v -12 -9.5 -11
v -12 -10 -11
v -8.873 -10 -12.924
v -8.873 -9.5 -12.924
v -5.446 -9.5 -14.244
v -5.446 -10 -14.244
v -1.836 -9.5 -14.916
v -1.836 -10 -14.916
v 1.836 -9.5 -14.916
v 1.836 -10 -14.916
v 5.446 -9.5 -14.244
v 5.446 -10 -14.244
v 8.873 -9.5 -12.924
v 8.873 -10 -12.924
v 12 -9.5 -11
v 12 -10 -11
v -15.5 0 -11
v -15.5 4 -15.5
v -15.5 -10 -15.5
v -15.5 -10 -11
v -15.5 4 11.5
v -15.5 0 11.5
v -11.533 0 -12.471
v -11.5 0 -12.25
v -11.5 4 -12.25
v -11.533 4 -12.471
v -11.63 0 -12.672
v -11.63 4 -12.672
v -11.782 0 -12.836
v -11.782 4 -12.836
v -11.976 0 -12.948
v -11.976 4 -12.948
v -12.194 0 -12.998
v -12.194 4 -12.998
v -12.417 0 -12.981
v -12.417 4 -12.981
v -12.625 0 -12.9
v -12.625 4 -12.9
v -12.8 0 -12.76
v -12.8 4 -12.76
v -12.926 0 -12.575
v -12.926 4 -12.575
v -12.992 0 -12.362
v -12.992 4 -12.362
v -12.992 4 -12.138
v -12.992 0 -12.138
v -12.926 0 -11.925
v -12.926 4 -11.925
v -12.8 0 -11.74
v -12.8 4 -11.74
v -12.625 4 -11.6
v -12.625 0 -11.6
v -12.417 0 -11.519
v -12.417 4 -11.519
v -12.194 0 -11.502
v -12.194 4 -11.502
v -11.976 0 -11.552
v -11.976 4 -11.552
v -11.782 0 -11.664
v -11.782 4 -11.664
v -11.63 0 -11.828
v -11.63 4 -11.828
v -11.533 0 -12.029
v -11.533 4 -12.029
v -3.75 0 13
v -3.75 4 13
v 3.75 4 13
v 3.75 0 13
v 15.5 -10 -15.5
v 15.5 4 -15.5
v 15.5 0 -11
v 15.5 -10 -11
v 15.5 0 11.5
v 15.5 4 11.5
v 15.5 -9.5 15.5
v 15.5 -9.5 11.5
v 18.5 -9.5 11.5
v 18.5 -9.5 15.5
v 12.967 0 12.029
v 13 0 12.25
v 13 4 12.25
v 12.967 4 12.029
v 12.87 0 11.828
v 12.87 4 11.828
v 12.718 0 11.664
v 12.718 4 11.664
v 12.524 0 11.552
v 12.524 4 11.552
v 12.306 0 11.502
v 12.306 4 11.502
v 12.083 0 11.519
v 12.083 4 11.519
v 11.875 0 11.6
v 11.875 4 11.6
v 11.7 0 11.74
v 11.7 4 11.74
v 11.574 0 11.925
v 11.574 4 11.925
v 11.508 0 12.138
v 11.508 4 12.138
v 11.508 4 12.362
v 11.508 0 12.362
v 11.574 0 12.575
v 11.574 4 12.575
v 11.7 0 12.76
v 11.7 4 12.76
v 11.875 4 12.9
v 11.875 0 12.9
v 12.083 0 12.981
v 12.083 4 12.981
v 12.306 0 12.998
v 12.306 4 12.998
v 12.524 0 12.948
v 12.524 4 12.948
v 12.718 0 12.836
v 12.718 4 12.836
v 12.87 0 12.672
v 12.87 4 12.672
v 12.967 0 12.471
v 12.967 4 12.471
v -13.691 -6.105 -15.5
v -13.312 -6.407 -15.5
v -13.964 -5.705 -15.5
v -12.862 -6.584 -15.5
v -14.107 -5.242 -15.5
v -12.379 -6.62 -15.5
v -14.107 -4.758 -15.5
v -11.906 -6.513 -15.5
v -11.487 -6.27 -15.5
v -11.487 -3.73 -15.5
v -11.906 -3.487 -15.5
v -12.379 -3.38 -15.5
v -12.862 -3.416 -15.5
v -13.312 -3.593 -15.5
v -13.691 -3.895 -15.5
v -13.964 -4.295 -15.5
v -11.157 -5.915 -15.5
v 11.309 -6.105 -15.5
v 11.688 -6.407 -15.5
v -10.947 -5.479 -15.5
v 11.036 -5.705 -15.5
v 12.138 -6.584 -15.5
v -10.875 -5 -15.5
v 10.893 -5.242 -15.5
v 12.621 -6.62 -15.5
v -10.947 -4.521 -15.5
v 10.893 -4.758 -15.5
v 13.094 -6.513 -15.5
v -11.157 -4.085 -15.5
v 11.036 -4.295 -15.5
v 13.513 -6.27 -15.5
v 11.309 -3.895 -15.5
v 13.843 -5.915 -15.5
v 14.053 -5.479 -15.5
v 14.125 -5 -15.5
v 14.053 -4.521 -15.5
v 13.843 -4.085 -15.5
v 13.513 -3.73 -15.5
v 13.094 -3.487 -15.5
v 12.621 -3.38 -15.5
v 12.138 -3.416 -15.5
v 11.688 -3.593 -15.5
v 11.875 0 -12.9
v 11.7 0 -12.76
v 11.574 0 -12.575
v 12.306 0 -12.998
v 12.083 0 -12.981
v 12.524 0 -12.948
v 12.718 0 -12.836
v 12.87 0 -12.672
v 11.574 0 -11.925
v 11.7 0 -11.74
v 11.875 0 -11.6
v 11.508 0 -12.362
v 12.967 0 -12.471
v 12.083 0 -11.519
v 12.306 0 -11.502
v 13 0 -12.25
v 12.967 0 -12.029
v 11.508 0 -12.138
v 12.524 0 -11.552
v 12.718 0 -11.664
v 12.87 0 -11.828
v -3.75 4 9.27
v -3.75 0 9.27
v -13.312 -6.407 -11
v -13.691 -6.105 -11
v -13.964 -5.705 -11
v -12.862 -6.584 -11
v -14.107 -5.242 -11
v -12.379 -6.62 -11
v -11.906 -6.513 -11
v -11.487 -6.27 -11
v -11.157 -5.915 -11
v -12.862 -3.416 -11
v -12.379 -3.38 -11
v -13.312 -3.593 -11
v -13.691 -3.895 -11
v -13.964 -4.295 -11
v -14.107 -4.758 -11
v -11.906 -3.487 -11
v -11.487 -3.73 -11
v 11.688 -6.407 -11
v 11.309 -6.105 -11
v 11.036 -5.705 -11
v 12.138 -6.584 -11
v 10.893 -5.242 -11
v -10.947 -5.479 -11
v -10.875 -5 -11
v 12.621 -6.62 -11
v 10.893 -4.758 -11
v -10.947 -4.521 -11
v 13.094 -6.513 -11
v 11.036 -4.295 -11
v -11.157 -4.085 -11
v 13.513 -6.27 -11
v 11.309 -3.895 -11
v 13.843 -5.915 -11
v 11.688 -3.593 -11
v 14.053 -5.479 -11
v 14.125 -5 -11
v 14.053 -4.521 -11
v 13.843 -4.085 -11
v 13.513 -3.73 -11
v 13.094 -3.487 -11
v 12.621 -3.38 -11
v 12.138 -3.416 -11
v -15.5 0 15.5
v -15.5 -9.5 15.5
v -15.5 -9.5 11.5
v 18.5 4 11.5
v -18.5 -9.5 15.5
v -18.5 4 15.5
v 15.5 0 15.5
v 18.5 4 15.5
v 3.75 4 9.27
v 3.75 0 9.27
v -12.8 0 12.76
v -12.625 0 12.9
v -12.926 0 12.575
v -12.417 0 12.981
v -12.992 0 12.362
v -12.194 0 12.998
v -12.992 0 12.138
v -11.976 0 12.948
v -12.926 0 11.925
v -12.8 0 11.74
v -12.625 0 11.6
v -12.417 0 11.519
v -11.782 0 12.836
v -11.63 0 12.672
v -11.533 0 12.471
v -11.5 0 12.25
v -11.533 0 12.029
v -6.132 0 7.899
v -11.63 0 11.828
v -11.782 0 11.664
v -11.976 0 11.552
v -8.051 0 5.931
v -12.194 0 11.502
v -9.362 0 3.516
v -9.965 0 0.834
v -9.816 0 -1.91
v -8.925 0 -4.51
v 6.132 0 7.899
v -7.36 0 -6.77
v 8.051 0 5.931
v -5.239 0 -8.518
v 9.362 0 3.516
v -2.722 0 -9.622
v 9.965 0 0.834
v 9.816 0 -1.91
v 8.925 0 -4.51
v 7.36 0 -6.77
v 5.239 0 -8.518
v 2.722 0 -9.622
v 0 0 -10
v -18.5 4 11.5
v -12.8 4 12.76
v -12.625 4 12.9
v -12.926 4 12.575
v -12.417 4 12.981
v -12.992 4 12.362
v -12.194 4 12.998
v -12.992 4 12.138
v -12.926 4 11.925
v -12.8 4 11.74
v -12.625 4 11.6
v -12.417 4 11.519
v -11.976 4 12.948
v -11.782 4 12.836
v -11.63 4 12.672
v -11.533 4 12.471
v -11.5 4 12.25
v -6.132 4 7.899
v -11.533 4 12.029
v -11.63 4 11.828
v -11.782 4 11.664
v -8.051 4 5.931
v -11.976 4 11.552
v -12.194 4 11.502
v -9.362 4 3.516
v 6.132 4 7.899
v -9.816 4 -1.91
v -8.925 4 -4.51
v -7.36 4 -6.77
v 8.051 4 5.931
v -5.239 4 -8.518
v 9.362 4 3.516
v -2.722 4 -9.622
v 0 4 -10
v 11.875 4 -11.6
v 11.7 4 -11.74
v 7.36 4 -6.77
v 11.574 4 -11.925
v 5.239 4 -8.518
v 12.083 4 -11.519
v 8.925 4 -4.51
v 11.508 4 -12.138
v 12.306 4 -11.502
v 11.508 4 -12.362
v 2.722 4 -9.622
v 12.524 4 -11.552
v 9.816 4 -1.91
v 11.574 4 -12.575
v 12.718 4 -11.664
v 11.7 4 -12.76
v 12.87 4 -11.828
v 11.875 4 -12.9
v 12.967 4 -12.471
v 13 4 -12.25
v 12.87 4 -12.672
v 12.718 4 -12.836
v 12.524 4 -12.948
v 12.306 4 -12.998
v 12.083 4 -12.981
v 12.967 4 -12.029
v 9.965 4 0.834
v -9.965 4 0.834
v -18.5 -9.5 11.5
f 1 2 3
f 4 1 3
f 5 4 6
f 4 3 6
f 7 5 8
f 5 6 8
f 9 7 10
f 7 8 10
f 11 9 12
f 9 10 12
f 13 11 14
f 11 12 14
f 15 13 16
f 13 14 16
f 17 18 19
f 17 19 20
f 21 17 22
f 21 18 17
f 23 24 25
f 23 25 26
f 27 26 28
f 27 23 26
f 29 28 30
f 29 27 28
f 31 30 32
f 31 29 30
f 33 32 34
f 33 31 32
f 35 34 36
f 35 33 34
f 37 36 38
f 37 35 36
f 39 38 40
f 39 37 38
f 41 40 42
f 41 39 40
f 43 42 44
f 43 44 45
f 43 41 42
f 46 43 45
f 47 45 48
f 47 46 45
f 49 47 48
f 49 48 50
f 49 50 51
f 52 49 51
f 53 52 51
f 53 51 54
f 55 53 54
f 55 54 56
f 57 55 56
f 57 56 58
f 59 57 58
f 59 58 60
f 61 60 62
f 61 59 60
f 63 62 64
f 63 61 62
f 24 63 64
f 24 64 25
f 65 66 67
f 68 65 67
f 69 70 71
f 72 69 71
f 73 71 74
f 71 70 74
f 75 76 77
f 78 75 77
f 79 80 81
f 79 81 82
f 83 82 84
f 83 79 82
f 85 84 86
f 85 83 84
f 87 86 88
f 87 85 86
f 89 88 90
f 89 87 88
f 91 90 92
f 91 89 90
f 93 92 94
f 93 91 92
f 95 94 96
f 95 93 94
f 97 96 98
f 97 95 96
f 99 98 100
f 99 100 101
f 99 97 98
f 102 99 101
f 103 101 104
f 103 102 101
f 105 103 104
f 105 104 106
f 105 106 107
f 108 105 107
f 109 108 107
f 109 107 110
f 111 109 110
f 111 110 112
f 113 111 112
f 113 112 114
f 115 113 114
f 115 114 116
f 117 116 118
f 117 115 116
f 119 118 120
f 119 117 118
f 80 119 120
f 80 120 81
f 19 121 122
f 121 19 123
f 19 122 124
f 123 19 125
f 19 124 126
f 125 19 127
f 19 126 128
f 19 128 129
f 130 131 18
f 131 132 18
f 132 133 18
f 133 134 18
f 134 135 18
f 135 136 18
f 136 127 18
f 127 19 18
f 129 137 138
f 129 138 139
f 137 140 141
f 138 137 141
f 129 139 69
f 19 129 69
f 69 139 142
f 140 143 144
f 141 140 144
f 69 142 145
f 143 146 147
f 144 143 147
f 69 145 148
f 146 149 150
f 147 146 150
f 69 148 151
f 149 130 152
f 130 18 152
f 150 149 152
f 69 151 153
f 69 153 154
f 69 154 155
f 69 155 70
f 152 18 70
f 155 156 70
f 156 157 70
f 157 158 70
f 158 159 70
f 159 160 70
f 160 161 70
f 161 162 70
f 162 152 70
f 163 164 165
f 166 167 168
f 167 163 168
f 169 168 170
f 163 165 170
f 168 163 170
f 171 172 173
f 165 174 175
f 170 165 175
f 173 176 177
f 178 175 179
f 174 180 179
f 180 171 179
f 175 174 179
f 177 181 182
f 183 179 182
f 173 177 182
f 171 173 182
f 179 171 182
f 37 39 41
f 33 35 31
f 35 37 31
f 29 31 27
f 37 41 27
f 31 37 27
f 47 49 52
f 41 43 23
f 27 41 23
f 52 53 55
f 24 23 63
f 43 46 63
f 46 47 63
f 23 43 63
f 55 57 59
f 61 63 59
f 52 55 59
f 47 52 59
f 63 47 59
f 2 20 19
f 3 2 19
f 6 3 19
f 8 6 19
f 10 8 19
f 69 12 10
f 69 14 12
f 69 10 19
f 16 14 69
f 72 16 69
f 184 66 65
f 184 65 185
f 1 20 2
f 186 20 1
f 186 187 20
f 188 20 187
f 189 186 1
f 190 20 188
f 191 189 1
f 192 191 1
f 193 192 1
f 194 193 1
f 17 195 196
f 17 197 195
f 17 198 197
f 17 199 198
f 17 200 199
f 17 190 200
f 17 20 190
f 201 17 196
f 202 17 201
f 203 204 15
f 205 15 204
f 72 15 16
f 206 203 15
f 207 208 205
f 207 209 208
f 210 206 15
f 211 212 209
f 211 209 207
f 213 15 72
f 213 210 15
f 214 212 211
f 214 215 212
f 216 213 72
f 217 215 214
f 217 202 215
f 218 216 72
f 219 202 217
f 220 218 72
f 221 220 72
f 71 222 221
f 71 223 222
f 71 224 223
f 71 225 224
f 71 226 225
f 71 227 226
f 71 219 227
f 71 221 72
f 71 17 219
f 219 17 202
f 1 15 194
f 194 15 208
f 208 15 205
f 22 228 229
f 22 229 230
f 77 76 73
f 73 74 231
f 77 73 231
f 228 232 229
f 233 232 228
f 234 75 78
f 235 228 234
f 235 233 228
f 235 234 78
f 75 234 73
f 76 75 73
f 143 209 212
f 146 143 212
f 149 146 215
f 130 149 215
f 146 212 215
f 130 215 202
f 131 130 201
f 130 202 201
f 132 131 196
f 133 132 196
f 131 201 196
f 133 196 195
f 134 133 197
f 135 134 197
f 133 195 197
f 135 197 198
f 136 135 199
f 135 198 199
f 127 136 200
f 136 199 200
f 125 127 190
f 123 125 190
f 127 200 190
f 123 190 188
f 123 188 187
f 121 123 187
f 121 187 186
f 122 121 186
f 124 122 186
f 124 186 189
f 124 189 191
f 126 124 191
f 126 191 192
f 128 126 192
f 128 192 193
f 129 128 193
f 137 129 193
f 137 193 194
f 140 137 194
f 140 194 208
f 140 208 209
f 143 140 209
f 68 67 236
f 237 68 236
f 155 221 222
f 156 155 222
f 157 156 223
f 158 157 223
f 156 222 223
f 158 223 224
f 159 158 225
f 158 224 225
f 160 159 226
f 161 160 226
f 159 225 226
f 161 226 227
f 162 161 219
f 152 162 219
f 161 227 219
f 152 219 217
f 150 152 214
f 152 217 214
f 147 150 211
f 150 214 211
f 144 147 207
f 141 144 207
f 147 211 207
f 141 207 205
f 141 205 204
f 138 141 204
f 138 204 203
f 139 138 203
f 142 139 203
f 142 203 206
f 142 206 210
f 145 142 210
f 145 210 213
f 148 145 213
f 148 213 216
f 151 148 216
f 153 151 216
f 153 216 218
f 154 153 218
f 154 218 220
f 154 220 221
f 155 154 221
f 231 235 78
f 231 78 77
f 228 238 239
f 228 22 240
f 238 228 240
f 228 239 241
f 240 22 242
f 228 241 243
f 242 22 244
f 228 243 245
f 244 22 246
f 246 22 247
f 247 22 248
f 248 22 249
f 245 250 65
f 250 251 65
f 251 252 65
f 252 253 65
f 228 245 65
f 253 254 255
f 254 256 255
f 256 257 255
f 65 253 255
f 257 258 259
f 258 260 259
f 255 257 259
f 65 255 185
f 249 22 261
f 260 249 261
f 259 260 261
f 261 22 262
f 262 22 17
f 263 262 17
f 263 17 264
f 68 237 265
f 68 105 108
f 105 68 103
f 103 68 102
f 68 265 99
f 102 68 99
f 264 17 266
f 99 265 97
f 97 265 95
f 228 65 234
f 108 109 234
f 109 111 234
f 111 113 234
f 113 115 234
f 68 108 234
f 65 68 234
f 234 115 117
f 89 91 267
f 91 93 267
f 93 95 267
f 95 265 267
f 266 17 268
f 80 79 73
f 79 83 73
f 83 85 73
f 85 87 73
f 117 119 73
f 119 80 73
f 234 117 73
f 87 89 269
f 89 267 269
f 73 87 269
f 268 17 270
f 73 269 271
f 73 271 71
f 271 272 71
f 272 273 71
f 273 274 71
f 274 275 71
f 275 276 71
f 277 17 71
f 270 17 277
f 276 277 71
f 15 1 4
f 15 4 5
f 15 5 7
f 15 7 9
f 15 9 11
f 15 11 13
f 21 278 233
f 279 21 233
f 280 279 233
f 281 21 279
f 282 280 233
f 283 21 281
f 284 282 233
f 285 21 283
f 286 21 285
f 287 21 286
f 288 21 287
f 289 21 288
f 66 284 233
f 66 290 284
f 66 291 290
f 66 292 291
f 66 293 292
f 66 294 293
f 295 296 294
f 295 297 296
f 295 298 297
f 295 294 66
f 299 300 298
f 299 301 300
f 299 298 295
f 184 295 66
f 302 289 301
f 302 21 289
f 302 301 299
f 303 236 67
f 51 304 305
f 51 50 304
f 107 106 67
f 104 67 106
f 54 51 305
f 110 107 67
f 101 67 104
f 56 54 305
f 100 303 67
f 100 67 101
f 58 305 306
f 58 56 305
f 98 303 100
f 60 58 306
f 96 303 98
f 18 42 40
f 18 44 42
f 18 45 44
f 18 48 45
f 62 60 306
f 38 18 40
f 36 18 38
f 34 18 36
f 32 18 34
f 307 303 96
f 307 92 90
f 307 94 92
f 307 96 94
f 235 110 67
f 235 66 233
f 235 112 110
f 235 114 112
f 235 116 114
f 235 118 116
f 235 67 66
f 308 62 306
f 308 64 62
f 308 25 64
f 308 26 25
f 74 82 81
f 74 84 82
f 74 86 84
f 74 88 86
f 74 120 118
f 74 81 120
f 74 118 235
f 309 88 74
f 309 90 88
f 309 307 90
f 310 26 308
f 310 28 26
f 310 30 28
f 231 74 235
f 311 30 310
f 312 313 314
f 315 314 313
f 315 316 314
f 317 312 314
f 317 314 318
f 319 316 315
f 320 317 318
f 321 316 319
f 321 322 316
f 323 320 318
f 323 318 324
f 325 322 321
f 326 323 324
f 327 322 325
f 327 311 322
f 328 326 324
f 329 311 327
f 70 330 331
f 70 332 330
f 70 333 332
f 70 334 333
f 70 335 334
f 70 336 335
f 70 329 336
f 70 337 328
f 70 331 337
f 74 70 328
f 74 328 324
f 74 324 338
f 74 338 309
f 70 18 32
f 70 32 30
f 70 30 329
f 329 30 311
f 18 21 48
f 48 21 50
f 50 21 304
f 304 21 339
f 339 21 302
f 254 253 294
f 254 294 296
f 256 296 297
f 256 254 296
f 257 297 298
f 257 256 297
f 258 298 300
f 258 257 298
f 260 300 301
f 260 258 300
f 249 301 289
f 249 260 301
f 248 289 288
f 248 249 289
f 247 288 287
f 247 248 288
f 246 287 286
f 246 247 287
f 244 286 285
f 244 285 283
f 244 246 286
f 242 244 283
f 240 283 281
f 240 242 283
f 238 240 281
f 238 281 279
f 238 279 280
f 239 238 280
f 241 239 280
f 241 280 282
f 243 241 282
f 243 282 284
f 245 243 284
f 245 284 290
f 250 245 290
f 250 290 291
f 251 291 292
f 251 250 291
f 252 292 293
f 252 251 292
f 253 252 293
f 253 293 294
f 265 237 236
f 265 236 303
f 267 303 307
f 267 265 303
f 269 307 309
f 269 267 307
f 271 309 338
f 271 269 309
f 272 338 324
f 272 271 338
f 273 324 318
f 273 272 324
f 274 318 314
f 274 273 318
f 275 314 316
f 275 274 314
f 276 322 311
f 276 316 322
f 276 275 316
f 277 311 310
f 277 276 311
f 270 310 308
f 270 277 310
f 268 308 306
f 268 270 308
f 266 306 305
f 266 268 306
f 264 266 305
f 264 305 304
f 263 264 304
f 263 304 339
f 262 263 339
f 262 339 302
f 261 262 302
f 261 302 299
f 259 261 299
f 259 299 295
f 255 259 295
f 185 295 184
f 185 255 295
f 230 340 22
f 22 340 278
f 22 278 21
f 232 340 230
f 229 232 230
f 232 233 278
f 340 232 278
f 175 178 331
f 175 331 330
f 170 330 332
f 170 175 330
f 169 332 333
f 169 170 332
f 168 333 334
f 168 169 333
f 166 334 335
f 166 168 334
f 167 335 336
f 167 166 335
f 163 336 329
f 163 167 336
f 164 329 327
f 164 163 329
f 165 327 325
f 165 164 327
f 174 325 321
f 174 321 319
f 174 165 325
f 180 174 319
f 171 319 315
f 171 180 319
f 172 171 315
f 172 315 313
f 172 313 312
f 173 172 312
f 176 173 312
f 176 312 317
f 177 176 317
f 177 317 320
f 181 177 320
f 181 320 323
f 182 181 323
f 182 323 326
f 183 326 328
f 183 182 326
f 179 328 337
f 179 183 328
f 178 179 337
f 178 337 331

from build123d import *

# Parameters (mm, degrees)
SKETCH1_W           = 31
SKETCH1_H           = 31
SKETCH1_R           = 0.75
SKETCH1_R_2         = 10
BOSS_EXTRUDE1_DEPTH = 4
SKETCH2_W           = 31
SKETCH2_H           = 4.5
BOSS_EXTRUDE2_DEPTH = 10
SKETCH3_R           = 1.625
CUT_EXTRUDE1_DEPTH  = 5.5
SKETCH4_W           = 7.5
SKETCH4_H           = 8
CUT_EXTRUDE2_DEPTH  = 15
SKETCH5_R           = 20
CUT_EXTRUDE3_DEPTH  = 0.5
SKETCH6_W           = 3
SKETCH6_H           = 4
BOSS_EXTRUDE3_DEPTH = 13.5


with BuildPart() as part:
    # Sketch1 → Boss-Extrude1 (new body)
    with BuildSketch(Plane(origin=(0, 0, 0), x_dir=(1, 0, 0), z_dir=(0, 1, 0))):
        Rectangle(SKETCH1_W, SKETCH1_H)
        with Locations((-12.25, 12.25)):
            Circle(SKETCH1_R, mode=Mode.SUBTRACT)
        with Locations((12.25, 12.25)):
            Circle(SKETCH1_R, mode=Mode.SUBTRACT)
        with Locations((12.25, -12.25)):
            Circle(SKETCH1_R, mode=Mode.SUBTRACT)
        with Locations((-12.25, -12.25)):
            Circle(SKETCH1_R, mode=Mode.SUBTRACT)
        Circle(SKETCH1_R_2, mode=Mode.SUBTRACT)
    extrude(amount=BOSS_EXTRUDE1_DEPTH)

    # Sketch2 → Boss-Extrude2 (add)
    with BuildSketch(Plane.XZ):
        with Locations((0, -13.25)):
            Rectangle(SKETCH2_W, SKETCH2_H)
    extrude(amount=BOSS_EXTRUDE2_DEPTH)

    # Sketch3 → Cut-Extrude1 (cut, through all)
    with BuildSketch(Plane.XY.offset(-11)):
        with Locations((-12.5, -5)):
            Circle(SKETCH3_R)
        with Locations((12.5, -5)):
            Circle(SKETCH3_R)
    extrude(amount=-CUT_EXTRUDE1_DEPTH, mode=Mode.SUBTRACT)

    # Sketch4 → Cut-Extrude2 (cut, through all)
    with BuildSketch(Plane(origin=(0, 4, 0), x_dir=(1, 0, 0), z_dir=(0, 1, 0))):
        with Locations((0, -9)):
            Rectangle(SKETCH4_W, SKETCH4_H)
    extrude(amount=-CUT_EXTRUDE2_DEPTH, mode=Mode.SUBTRACT)

    # Sketch5 → Cut-Extrude3 (cut)
    with BuildSketch(Plane.XZ.offset(10)):
        with Locations((0, 5)):
            Circle(SKETCH5_R)
    extrude(amount=-CUT_EXTRUDE3_DEPTH, mode=Mode.SUBTRACT)

    # Sketch6 → Boss-Extrude3 (add)
    with BuildSketch(Plane(origin=(0, 4, 0), x_dir=(1, 0, 0), z_dir=(0, 1, 0))):
        with Locations((-17, -13.5)):
            Rectangle(SKETCH6_W, SKETCH6_H)
        with Locations((17, -13.5)):
            Rectangle(SKETCH6_W, SKETCH6_H)
    extrude(amount=-BOSS_EXTRUDE3_DEPTH)


solid = part.part
